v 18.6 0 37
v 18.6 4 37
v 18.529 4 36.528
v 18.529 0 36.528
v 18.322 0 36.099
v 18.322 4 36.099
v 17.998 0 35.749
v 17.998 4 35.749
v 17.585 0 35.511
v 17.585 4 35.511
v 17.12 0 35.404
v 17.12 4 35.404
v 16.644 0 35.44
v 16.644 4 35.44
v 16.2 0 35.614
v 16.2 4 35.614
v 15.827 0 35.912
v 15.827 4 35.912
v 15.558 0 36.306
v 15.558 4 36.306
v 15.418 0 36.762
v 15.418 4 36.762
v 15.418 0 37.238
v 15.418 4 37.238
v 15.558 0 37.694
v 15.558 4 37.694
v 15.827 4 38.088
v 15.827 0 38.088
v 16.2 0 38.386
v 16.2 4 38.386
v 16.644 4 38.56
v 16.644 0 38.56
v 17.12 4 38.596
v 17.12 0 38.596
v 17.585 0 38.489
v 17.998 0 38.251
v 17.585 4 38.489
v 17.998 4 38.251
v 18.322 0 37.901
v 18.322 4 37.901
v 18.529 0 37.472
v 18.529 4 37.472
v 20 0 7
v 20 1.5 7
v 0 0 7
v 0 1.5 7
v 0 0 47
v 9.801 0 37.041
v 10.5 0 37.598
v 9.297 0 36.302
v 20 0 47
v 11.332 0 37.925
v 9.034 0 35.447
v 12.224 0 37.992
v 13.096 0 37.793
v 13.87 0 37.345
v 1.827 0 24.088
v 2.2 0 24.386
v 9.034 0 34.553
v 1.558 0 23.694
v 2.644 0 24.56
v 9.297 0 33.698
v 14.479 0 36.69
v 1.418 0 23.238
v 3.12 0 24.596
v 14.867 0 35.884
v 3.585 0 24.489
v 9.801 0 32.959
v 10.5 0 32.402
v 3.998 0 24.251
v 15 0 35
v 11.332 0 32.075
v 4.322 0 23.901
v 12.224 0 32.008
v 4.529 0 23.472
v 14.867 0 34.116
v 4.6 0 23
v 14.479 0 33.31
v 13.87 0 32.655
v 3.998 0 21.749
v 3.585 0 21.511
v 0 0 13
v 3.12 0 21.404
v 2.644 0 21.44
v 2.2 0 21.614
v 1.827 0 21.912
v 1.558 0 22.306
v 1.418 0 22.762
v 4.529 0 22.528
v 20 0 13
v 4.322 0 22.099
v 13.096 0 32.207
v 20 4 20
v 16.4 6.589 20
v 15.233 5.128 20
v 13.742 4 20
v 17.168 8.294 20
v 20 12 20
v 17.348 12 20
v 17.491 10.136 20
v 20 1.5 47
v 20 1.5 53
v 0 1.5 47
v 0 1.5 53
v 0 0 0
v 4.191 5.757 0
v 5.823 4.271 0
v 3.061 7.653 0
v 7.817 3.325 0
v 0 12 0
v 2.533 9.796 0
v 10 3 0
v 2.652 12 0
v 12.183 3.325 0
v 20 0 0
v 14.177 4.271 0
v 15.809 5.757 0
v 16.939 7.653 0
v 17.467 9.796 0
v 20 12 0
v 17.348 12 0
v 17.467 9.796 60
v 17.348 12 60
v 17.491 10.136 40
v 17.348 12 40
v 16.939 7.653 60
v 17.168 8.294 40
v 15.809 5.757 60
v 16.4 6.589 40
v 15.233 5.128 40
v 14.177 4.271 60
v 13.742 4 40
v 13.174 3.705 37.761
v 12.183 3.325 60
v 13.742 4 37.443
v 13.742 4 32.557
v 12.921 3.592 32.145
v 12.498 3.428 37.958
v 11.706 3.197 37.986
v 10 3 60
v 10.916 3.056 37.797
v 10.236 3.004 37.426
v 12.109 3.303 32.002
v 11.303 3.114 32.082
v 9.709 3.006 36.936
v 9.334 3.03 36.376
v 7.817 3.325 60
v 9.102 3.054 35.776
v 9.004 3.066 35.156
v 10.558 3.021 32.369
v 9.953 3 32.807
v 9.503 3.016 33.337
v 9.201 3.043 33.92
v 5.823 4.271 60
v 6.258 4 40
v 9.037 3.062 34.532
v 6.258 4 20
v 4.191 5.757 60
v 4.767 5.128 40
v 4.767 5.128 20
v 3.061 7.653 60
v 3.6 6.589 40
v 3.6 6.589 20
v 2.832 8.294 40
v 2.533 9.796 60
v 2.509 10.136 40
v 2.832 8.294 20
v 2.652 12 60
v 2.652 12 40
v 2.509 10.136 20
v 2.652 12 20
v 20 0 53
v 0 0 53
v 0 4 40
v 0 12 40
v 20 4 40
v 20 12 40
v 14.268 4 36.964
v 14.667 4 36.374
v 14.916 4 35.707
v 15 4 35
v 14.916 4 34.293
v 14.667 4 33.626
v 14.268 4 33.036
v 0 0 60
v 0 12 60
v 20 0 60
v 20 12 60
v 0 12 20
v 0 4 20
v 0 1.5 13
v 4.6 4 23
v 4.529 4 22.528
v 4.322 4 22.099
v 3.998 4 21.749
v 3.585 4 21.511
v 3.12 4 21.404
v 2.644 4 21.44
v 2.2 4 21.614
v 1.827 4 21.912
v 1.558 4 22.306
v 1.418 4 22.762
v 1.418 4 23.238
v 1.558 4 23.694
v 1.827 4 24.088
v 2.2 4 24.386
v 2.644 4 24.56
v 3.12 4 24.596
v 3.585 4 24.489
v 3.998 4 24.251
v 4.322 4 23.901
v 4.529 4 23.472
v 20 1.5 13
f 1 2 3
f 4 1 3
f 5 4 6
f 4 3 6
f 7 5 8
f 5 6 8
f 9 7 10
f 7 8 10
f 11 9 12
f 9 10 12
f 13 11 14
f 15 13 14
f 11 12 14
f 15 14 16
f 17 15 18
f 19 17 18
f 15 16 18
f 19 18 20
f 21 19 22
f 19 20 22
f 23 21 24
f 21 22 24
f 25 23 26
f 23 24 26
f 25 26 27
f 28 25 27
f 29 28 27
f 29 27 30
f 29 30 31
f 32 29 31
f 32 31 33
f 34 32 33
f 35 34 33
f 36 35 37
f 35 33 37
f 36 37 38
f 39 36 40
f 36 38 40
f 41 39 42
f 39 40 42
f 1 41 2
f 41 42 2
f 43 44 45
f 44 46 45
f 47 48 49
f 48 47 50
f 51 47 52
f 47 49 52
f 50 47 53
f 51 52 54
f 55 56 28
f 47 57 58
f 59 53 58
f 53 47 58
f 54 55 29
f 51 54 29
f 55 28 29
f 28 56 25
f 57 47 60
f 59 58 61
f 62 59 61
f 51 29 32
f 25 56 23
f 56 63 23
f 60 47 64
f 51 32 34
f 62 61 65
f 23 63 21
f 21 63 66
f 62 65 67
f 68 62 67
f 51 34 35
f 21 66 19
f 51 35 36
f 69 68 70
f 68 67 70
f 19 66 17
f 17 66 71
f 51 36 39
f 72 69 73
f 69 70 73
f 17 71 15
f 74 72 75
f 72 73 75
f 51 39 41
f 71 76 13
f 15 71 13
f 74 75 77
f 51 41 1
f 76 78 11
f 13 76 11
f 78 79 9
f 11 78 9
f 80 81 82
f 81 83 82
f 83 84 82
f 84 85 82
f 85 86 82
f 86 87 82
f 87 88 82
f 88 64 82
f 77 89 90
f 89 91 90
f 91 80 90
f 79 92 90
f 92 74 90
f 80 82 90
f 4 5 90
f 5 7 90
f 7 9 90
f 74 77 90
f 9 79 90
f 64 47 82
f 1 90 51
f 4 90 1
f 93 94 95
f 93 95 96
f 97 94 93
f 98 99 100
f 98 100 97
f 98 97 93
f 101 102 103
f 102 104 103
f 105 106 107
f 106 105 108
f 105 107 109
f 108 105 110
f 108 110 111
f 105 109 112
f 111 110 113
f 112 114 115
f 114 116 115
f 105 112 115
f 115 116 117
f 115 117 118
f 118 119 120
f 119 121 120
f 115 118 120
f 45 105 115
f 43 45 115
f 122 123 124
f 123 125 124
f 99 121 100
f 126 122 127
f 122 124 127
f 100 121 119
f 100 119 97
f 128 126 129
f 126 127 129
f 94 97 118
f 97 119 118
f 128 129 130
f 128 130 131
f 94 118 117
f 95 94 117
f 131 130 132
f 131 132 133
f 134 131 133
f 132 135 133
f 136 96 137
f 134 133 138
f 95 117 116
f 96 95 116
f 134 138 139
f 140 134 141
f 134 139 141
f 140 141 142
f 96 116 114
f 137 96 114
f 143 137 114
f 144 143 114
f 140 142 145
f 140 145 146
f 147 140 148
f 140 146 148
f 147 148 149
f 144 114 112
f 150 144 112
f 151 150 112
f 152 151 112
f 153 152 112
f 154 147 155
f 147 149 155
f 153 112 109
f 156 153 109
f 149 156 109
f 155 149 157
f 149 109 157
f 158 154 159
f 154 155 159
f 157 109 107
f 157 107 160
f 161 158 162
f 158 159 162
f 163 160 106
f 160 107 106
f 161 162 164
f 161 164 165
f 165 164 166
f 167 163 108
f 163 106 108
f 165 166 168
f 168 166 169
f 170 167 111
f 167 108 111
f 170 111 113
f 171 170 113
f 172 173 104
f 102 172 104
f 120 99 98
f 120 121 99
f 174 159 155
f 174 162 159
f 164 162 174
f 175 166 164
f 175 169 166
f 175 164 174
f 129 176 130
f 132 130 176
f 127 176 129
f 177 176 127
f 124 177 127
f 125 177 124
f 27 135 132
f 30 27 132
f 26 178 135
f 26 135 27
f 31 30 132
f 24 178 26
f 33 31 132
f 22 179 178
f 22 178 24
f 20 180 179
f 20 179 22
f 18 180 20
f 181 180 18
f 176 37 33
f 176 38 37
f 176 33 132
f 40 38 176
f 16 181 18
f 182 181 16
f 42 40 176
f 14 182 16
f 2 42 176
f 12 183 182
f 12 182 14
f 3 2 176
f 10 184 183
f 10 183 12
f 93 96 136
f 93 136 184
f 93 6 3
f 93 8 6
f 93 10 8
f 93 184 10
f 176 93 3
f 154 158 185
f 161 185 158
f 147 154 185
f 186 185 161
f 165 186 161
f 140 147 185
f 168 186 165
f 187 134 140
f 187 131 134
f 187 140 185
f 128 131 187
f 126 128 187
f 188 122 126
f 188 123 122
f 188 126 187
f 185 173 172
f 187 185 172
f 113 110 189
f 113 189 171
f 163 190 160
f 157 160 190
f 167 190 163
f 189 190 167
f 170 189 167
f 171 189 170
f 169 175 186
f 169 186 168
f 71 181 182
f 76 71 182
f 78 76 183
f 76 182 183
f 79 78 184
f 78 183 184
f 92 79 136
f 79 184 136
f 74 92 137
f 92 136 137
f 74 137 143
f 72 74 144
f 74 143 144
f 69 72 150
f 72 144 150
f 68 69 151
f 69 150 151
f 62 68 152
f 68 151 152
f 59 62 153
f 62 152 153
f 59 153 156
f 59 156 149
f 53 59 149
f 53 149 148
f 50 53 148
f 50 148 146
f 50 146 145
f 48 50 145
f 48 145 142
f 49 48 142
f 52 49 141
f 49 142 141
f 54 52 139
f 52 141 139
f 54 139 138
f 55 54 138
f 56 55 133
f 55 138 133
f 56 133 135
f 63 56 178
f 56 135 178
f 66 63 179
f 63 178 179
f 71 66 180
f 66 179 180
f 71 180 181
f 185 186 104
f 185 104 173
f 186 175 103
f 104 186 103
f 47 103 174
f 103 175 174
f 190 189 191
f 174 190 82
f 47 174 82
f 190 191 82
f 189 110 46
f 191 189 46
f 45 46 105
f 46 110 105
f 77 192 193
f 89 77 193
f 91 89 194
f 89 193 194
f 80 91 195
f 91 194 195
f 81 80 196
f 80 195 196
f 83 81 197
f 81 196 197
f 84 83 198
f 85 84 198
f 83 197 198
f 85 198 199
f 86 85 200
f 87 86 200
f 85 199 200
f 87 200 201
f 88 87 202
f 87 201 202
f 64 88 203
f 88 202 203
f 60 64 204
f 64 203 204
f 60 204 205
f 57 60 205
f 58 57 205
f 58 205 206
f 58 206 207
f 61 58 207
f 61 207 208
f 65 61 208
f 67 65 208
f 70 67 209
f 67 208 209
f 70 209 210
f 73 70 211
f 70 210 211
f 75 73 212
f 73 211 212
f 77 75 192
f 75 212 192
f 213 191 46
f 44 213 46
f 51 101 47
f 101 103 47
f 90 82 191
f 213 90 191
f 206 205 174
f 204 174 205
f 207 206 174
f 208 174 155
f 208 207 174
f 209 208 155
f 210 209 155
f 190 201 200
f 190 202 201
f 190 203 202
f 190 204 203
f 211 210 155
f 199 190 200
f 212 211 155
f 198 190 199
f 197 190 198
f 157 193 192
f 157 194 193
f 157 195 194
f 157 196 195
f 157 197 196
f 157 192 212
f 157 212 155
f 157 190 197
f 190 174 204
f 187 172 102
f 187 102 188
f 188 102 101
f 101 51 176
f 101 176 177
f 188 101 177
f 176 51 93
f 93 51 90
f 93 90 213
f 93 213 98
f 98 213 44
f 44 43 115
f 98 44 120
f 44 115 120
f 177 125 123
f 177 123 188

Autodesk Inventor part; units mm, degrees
ref_plane "YZ Plane" through (0, 0, 0) normal (1, 0, 0) x (0, 1, 0)
ref_plane "XZ Plane" through (0, 0, 0) normal (0, 1, 0) x (-1, 0, 0)
ref_plane "XY Plane" through (0, 0, 0) normal (0, 0, 1) x (1, 0, 0)
sketch "Sketch1" plane through (0, 0, 0) normal (0, 0, 1) x (1, 0, 0)
  line L0 (0, 0) -> (20, 0)
  line L1 (20, 0) -> (20, 12)
  line L2 (20, 12) -> (0, 12) construction
  line L3 (0, 12) -> (0, 0)
  arc A0 (2.6515, 12) -> (17.3485, 12) centre (10, 10.5) ccw
  line L4 (0, 12) -> (2.6515, 12)
  line L5 (17.3485, 12) -> (20, 12)
  point P0 (10, 12)
  dimension "d0" = 20
  dimension "d1" = 12
  dimension "d2" = 15
  dimension "d14" = 1.5
extrude "Extrusion1" add sketch "Sketch1" along normal blind 60
sketch "Sketch4" plane through (0, 12, 0) normal (0, 1, 0) x (1, 0, 0)
  line L0 (0, -20) -> (20, -20)
  line L1 (20, -20) -> (20, -40)
  line L2 (20, -40) -> (0, -40)
  line L3 (0, -40) -> (0, -20)
  line L4 (0, 0) -> (0, -60) projected
  line L5 (17.5, 0) -> (2.5, 0) projected
  line L6 (20, 0) -> (20, -60) projected
  point P0 (0, -30)
  point P1 (0, -30)
  point P2 (10, -20)
  point P3 (10, 0)
  point P4 (17.3485, 0)
  point P5 (2.6515, 0)
  dimension "d15" = 20
extrude "Extrusion4" cut sketch "Sketch4" against normal blind 8
sketch "Sketch5" plane through (0, 4, 0) normal (0, 1, 0) x (1, 0, 0)
  circle A0 centre (3, -23) radius 1.6
  circle A1 centre (17, -37) radius 1.6
  line L0 (17, -37) -> (3, -37) construction
  line L1 (3, -37) -> (3, -23) construction
  line L2 (3, -23) -> (17, -23) construction
  line L3 (17, -23) -> (17, -37) construction
  line L4 (0, -40) -> (0, -20) construction
  line L5 (17.5, 0) -> (2.5, 0) construction
  line L6 (6.2583, -40) -> (2.5, -40) construction
  circle A2 centre (12, -35) radius 1.6 construction
  circle A3 centre (12, -35) radius 3
  point P0 (0, 0)
  point P1 (3, -30)
  point P2 (0, -30)
  point P3 (10, -23)
  point P4 (10, 0)
  point P5 (17.3485, 0)
  point P6 (2.6515, 0)
  point P7 (17.3485, -40)
  point P8 (2.6515, -40)
  dimension "d19" = 3.2
  dimension "d20" = 3.2
  dimension "d21" = 3
  dimension "d22" = 3
  dimension "d30" = 6
extrude "Extrusion5" cut sketch "Sketch5" against normal blind 10
sketch "Sketch6" plane through (0, 0, 0) normal (-1, 0, 0) x (0, 0, 1)
  line L0 (7, 0) -> (13, 0)
  line L1 (13, 0) -> (13, 1.5)
  line L2 (13, 1.5) -> (7, 1.5)
  line L3 (7, 1.5) -> (7, 0)
  line L4 (47, 0) -> (53, 0)
  line L5 (53, 0) -> (53, 1.5)
  line L6 (53, 1.5) -> (47, 1.5)
  line L7 (47, 1.5) -> (47, 0)
  line L8 (0, 12) -> (20, 12) construction
  line L9 (40, 12) -> (60, 12) construction
  point P0 (0, 0)
  point P1 (10, 1.5)
  point P2 (10, 12)
  point P3 (50, 1.5)
  point P4 (50, 12)
  dimension "d25" = 6
  dimension "d26" = 1.5
  dimension "d27" = 6
extrude "Extrusion6" cut sketch "Sketch6" against normal through all
equation "\"d20\" = d19"
properties part number "Linear bearing 8mm clamp"
